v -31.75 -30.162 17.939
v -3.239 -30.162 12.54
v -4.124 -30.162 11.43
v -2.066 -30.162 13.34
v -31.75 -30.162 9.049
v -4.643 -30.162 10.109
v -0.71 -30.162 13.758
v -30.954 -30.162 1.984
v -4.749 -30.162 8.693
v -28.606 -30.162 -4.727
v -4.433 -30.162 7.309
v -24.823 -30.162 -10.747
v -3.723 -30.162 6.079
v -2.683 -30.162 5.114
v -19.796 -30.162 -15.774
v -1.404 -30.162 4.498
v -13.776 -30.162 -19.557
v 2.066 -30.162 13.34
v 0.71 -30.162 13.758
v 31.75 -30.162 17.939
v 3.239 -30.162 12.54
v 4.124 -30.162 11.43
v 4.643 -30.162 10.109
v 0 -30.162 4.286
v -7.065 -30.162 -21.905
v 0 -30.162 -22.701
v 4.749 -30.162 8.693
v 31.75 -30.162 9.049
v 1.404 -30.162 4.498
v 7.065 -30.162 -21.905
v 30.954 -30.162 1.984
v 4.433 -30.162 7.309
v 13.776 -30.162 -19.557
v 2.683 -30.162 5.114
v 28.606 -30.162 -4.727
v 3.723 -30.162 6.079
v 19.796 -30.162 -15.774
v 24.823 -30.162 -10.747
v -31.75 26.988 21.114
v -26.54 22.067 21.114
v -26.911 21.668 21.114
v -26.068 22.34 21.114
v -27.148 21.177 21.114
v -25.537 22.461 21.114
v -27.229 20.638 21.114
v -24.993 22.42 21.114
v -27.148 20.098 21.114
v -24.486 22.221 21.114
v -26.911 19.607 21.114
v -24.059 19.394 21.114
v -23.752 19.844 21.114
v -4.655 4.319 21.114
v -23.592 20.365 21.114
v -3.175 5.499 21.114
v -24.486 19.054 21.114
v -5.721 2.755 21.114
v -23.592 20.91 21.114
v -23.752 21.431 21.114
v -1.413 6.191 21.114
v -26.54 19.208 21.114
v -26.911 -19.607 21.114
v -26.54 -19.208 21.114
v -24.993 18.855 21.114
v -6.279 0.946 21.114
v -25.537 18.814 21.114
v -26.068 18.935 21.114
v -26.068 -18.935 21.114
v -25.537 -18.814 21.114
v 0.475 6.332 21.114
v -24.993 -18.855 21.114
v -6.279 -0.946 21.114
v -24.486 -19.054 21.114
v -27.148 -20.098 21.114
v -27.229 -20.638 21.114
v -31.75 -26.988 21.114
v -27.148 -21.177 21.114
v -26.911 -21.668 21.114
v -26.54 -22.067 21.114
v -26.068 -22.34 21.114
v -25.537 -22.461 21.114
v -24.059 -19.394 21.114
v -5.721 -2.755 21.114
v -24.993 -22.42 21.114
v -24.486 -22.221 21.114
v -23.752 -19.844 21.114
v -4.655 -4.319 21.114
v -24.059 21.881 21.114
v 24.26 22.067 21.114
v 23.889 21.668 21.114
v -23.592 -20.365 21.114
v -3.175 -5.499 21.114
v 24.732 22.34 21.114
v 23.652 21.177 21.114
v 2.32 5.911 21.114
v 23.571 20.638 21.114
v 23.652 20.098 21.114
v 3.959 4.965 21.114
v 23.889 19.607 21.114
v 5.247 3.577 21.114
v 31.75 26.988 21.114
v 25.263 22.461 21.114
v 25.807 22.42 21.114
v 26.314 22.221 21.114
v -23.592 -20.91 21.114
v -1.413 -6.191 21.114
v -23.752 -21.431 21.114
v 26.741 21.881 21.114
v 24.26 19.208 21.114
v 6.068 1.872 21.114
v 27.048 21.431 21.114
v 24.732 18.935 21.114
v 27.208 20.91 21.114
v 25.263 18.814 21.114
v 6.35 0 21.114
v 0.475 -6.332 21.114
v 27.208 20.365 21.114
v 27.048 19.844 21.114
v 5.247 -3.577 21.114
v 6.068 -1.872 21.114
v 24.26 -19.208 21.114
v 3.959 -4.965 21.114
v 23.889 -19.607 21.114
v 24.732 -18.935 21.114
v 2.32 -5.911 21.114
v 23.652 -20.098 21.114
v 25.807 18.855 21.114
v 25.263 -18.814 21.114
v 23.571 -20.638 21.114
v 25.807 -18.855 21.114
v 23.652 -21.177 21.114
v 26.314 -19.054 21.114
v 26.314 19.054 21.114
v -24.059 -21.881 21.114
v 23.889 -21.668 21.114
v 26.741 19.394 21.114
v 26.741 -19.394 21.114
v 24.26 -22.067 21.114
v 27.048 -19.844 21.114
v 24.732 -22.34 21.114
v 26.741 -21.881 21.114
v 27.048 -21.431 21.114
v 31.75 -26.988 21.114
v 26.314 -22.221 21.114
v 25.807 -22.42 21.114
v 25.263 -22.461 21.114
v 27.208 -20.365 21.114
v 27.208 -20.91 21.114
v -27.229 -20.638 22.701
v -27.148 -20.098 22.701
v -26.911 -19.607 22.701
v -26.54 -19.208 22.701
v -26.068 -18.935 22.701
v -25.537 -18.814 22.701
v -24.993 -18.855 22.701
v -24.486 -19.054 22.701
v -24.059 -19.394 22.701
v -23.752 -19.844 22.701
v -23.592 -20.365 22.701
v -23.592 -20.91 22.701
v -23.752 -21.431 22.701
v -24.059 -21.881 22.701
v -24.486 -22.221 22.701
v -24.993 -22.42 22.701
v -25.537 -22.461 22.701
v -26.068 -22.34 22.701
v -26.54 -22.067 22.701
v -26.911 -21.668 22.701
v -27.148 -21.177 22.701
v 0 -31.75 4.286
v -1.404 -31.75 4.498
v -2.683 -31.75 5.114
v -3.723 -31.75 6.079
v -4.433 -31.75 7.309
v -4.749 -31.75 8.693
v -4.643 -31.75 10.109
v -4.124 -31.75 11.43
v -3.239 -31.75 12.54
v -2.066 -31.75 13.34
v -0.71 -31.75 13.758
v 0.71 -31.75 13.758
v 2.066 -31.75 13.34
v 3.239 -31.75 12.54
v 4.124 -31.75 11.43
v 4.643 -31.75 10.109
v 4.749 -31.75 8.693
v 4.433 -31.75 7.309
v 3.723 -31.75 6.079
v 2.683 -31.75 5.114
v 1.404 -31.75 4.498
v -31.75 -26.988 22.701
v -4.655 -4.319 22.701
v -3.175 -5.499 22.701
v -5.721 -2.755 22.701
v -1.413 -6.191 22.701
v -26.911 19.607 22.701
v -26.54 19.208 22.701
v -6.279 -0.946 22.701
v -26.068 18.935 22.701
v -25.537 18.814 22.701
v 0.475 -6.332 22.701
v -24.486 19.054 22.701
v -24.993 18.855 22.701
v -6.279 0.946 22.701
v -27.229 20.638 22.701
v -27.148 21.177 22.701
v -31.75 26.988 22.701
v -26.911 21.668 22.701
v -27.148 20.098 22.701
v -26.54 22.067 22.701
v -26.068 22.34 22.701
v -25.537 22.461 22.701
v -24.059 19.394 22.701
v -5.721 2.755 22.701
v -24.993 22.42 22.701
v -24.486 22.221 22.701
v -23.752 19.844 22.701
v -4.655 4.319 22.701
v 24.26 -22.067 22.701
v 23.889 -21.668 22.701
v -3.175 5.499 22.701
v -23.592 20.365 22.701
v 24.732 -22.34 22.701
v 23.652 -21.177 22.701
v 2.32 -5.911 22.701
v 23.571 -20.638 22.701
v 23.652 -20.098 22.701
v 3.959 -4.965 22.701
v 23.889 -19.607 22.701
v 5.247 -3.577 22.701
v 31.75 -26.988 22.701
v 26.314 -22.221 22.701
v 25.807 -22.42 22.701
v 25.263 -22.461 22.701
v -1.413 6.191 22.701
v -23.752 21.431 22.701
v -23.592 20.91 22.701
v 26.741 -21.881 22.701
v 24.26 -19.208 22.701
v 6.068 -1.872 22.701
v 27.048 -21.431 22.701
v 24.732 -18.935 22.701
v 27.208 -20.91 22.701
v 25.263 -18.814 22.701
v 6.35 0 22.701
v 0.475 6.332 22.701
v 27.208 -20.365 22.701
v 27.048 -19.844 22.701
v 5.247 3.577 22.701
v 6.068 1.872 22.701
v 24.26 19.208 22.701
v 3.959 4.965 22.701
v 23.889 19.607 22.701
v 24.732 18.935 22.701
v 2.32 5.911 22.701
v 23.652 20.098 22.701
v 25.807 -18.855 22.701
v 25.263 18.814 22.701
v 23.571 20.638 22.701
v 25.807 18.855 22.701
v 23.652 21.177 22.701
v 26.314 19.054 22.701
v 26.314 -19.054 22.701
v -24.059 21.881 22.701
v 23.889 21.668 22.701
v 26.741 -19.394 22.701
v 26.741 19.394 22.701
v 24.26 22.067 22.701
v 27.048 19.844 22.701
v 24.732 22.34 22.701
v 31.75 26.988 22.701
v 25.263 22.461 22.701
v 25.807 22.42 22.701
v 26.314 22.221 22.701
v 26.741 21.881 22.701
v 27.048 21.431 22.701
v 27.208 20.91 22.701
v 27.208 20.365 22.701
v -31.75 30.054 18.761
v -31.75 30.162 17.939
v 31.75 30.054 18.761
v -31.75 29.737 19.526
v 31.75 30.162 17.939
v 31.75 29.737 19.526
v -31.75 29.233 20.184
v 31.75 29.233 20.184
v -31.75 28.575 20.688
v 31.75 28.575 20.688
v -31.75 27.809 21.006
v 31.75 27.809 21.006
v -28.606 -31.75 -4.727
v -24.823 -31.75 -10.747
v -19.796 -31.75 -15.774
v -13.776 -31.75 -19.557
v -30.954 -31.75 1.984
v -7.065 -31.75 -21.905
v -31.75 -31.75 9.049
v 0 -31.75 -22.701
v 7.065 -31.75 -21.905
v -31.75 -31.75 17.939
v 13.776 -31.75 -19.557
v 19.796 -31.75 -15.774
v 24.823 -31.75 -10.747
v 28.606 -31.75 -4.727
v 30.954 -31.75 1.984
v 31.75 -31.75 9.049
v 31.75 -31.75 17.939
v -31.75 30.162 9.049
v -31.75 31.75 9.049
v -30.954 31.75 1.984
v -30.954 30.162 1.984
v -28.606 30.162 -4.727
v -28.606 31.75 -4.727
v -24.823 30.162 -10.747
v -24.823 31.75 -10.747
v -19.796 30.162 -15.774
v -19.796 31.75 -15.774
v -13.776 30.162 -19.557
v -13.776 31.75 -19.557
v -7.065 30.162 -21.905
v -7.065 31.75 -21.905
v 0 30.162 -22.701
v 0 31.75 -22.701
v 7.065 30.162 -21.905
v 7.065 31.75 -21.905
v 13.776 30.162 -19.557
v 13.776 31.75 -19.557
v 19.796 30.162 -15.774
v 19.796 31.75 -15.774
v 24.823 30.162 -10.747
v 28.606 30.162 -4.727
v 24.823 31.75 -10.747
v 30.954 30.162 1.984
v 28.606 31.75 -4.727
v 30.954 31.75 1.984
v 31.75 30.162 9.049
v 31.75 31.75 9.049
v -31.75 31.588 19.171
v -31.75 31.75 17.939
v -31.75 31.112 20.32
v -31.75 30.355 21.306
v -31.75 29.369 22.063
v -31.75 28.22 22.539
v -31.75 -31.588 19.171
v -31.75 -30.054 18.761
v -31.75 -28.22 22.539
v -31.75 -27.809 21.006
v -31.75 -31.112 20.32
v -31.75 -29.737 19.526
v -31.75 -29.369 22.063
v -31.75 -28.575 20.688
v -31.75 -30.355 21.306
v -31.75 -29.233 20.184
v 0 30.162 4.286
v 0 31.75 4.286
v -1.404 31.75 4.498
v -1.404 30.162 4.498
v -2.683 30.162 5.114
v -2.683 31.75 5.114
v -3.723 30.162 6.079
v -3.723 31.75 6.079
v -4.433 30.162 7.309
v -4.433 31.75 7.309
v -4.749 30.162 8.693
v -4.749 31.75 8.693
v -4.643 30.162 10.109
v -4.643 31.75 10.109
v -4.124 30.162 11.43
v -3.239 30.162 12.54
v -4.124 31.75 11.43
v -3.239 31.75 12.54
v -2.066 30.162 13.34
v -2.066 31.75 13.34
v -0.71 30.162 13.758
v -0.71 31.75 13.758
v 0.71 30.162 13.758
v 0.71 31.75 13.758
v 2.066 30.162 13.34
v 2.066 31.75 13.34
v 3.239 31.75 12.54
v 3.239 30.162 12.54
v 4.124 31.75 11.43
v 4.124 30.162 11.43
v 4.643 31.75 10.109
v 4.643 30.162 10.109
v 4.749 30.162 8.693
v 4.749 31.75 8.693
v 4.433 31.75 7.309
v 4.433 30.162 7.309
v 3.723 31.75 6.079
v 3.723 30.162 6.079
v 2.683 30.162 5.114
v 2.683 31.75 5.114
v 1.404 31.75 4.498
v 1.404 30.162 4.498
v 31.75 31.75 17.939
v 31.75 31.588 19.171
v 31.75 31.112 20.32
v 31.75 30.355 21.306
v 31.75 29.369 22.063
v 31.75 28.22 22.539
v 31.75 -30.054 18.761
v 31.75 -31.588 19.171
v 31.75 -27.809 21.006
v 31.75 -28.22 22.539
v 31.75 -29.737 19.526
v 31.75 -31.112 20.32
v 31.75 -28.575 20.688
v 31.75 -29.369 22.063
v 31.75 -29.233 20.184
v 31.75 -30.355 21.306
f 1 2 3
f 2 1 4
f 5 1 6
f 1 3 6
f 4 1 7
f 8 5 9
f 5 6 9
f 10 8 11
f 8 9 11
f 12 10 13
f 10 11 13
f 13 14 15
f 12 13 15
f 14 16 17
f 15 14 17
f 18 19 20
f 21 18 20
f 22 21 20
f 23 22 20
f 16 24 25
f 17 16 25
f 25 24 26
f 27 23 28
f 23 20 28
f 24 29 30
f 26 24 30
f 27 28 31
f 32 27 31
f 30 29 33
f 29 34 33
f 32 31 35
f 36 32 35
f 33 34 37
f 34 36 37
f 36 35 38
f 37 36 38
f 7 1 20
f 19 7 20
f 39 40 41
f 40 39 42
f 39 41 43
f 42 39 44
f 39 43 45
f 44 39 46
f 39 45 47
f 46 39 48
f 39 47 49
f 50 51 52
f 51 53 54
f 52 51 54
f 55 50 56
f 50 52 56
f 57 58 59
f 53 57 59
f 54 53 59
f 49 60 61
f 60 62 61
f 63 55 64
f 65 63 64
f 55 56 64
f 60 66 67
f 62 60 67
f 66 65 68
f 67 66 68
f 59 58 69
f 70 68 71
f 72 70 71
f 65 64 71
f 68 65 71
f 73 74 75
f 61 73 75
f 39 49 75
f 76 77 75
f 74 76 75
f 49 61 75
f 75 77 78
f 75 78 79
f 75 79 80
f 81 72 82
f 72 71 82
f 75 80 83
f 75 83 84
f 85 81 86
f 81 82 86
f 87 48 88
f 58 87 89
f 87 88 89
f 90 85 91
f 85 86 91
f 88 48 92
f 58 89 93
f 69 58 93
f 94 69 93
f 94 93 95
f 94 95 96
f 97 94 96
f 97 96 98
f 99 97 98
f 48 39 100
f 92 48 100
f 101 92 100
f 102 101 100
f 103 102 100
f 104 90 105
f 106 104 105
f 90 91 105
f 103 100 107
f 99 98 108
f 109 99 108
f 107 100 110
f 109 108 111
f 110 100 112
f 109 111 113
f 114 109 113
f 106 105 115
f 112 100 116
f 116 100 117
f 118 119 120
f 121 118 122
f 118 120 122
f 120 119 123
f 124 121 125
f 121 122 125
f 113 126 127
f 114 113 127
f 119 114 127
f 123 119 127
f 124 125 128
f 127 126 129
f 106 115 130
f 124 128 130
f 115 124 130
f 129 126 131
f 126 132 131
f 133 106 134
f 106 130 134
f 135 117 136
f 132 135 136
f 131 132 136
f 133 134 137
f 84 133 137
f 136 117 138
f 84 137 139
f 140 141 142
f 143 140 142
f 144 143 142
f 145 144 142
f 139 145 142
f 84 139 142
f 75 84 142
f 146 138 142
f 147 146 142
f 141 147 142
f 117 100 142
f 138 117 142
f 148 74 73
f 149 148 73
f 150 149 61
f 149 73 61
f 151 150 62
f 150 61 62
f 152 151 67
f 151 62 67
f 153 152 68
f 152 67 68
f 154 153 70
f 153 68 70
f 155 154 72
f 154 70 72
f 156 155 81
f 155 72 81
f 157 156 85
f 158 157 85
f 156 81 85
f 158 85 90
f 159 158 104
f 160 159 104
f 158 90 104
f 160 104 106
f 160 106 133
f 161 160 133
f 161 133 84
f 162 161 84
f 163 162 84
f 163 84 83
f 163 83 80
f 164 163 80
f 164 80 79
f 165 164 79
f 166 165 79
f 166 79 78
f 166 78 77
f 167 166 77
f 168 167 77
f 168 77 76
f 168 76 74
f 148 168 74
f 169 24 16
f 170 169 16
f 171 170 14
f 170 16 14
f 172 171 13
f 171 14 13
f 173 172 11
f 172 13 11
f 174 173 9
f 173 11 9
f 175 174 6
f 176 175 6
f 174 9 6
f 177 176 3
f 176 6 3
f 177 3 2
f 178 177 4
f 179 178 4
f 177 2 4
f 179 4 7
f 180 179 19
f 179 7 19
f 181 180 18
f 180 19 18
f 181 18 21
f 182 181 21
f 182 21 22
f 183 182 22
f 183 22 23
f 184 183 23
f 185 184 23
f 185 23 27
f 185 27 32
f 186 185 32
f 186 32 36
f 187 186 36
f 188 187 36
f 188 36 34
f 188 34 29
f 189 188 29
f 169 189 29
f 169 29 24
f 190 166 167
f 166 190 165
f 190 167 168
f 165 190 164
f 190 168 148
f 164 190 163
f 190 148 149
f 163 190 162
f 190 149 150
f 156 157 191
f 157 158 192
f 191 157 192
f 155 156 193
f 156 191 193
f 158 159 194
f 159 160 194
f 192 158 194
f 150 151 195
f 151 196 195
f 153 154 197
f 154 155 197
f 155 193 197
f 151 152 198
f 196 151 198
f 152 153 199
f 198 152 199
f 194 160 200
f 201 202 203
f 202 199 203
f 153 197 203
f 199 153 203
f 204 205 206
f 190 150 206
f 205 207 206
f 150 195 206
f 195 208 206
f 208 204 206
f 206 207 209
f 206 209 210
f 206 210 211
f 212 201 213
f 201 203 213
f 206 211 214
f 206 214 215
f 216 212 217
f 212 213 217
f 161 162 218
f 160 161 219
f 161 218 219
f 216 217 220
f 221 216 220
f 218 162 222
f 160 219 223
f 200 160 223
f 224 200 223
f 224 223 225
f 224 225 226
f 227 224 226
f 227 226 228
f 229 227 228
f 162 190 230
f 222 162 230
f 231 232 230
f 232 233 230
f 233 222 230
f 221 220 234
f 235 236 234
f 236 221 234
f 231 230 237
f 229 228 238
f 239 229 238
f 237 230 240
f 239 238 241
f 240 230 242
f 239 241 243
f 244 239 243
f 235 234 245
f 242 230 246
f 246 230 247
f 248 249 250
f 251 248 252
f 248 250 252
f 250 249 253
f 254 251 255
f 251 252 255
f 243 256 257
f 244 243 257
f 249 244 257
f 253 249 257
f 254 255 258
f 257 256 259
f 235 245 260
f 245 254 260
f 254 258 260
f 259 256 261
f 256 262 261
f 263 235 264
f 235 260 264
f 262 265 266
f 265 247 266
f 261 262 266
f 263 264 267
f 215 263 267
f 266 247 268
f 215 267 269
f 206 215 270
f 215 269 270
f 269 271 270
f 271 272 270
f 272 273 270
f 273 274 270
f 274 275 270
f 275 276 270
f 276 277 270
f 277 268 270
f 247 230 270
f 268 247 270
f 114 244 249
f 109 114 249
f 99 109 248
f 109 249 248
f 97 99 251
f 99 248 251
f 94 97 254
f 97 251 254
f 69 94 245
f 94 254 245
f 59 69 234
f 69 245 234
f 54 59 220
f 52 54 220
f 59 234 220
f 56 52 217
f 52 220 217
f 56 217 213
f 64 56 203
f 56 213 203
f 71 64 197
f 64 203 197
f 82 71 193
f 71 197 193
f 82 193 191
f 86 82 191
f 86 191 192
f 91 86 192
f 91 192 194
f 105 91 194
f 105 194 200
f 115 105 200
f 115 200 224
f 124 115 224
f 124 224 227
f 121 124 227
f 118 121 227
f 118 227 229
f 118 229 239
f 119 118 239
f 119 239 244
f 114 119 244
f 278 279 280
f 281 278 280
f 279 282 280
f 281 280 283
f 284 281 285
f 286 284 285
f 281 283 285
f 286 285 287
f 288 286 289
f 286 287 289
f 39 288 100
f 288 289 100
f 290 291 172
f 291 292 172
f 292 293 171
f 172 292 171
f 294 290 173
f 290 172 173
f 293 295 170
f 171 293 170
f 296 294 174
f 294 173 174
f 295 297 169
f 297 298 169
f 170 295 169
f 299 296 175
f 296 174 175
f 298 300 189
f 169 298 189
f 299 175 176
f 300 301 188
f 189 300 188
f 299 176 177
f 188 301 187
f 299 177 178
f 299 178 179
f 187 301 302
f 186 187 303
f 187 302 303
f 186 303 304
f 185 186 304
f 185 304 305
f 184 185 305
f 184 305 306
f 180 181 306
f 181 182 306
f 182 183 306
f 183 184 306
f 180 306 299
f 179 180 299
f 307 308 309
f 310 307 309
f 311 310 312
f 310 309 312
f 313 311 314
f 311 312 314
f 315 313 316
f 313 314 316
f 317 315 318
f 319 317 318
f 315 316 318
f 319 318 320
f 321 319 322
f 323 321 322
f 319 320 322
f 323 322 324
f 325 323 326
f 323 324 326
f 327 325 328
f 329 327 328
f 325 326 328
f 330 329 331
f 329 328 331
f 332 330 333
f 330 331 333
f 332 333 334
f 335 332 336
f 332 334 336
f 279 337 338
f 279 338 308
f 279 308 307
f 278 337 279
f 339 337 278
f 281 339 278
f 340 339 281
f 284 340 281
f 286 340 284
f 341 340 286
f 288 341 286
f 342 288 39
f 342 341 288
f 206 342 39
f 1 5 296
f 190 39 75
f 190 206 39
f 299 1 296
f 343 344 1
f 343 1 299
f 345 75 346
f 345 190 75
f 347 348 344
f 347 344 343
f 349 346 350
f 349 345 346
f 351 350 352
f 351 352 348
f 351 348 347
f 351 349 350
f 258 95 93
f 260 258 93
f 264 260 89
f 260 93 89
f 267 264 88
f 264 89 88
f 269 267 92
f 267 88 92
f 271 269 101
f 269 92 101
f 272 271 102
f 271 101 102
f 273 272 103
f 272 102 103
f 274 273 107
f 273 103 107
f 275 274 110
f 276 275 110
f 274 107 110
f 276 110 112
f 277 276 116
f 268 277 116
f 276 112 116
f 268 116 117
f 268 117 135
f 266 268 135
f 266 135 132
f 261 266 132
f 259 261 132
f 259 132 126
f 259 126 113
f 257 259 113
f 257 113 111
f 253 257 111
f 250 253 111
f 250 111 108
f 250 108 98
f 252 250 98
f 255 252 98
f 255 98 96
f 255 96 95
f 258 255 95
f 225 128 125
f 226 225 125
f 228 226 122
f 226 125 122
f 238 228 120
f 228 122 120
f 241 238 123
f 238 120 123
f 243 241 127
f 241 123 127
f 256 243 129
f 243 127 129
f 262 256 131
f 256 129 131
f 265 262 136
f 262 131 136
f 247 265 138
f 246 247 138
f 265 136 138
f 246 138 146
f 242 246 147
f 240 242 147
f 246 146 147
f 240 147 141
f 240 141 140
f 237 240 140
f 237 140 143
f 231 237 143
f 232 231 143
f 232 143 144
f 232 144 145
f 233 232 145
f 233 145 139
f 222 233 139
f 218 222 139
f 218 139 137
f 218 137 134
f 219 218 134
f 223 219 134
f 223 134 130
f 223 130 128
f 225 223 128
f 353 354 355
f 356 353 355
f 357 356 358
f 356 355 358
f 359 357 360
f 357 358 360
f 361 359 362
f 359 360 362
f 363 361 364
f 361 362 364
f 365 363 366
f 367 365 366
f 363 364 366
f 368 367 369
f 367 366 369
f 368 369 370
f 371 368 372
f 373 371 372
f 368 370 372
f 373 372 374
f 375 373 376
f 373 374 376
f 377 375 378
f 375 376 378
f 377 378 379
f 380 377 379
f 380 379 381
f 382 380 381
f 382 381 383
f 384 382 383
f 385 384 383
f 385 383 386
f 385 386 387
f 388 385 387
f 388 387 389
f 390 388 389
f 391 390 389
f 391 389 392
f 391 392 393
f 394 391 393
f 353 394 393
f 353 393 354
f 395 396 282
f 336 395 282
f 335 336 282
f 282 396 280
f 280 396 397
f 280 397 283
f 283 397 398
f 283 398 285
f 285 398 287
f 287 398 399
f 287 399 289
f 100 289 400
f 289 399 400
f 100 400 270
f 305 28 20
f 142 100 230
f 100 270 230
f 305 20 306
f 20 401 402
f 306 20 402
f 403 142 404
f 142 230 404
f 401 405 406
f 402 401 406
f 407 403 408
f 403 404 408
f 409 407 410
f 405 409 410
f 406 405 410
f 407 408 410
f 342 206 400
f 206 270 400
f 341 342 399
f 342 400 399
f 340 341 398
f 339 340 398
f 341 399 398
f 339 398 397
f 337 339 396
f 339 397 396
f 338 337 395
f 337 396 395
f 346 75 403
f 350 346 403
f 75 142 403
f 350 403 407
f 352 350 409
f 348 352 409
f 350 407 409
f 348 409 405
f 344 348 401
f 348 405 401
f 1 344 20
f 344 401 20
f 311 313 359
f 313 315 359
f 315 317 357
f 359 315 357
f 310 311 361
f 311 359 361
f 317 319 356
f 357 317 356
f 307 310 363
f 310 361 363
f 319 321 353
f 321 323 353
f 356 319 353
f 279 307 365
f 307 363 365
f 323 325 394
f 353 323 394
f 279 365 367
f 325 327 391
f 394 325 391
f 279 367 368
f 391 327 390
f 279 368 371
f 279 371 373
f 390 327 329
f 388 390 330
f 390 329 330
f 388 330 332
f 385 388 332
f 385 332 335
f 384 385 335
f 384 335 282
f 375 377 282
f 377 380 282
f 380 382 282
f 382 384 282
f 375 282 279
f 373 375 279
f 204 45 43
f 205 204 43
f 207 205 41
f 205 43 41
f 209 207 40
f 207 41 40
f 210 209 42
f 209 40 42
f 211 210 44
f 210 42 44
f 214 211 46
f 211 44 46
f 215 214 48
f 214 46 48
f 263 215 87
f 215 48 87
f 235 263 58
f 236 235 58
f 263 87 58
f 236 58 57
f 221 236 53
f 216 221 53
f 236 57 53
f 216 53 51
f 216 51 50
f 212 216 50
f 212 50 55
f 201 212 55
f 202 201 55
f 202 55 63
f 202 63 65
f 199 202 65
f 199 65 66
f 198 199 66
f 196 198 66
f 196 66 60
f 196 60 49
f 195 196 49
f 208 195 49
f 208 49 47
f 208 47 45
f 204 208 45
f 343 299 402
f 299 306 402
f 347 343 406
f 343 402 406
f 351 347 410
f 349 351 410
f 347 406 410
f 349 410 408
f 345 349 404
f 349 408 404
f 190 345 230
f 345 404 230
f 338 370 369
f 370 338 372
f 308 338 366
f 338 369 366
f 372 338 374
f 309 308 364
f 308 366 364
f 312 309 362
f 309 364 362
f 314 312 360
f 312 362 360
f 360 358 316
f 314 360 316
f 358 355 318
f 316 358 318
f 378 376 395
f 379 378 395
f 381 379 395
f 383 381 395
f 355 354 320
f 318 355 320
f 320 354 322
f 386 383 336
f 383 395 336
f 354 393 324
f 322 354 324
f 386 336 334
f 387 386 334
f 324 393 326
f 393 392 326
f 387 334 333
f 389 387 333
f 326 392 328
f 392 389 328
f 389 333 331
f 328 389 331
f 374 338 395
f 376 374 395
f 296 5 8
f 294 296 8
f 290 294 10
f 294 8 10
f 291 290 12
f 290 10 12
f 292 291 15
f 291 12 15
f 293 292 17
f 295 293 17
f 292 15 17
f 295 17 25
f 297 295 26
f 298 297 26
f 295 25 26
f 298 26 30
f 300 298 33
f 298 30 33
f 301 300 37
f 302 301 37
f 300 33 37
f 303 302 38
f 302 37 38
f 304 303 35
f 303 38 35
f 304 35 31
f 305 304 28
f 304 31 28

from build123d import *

# Parameters (mm, degrees)
BASE_FLANGE1_DEPTH          = 31.75
SKETCH6_R                   = 4.7625
CUT_EXTRUDE1_DEPTH          = 127
F_27_0_144_DIAMETER_HOLE1_D = 3.6576
SKETCH11_R                  = 6.35
CUT_EXTRUDE2_DEPTH          = 2.54


# Sheet-metal steps are written as plain solids
with BuildPart() as part:
    # Sketch1 → Base-Flange1 (new, symmetric)
    with BuildSketch(Plane.YZ):
        with BuildLine():
            Line((-31.75, -22.70125), (-31.75, 17.93875))
            ThreePointArc((-31.75, 17.93875), (-30.355096045, 21.306346045), (-26.9875, 22.70125))
            Line((-26.9875, 22.70125), (26.9875, 22.70125))
            ThreePointArc((26.9875, 22.70125), (30.355096045, 21.306346045), (31.75, 17.93875))
            Line((31.75, 17.93875), (31.75, -22.70125))
            Line((31.75, -22.70125), (30.1625, -22.70125))
            Line((30.1625, -22.70125), (30.1625, 17.93875))
            ThreePointArc((30.1625, 17.93875), (29.23256403, 20.18381403), (26.9875, 21.11375))
            Line((26.9875, 21.11375), (-26.9875, 21.11375))
            ThreePointArc((-26.9875, 21.11375), (-29.23256403, 20.18381403), (-30.1625, 17.93875))
            Line((-30.1625, 17.93875), (-30.1625, -22.70125))
            Line((-30.1625, -22.70125), (-31.75, -22.70125))
        make_face()
    extrude(amount=BASE_FLANGE1_DEPTH, both=True)

    # Sketch6 → Cut-Extrude1 (cut)
    with BuildSketch(Plane(origin=(0, 31.75, 0), x_dir=(-1, 0, 0), z_dir=(0, 1, 0))):
        with Locations(Location((0, 9.04875, 0), (0, 0, 270))):
            Circle(SKETCH6_R)
        with BuildLine():
            Line((-31.75, 9.04875), (-31.75, -117.95125))
            Line((-31.75, -117.95125), (31.75, -117.95125))
            Line((31.75, -117.95125), (31.75, 9.04875))
            ThreePointArc((31.75, 9.04875), (0, -22.70125), (-31.75, 9.04875))
        make_face()
    extrude(amount=-CUT_EXTRUDE1_DEPTH, mode=Mode.SUBTRACT)

    # #27 (0.144) Diameter Hole1 (through all)
    with Locations(Plane.XY.offset(22.70125)):
        with Locations((-25.4, 20.6375), (25.4, 20.6375), (25.4, -20.6375), (-25.4, -20.6375)):
            Hole(F_27_0_144_DIAMETER_HOLE1_D / 2)

    # Sketch11 → Cut-Extrude2 (cut)
    with BuildSketch(Plane.XY.offset(22.70125)):
        Circle(SKETCH11_R)
    extrude(amount=-CUT_EXTRUDE2_DEPTH, mode=Mode.SUBTRACT)


solid = part.part
